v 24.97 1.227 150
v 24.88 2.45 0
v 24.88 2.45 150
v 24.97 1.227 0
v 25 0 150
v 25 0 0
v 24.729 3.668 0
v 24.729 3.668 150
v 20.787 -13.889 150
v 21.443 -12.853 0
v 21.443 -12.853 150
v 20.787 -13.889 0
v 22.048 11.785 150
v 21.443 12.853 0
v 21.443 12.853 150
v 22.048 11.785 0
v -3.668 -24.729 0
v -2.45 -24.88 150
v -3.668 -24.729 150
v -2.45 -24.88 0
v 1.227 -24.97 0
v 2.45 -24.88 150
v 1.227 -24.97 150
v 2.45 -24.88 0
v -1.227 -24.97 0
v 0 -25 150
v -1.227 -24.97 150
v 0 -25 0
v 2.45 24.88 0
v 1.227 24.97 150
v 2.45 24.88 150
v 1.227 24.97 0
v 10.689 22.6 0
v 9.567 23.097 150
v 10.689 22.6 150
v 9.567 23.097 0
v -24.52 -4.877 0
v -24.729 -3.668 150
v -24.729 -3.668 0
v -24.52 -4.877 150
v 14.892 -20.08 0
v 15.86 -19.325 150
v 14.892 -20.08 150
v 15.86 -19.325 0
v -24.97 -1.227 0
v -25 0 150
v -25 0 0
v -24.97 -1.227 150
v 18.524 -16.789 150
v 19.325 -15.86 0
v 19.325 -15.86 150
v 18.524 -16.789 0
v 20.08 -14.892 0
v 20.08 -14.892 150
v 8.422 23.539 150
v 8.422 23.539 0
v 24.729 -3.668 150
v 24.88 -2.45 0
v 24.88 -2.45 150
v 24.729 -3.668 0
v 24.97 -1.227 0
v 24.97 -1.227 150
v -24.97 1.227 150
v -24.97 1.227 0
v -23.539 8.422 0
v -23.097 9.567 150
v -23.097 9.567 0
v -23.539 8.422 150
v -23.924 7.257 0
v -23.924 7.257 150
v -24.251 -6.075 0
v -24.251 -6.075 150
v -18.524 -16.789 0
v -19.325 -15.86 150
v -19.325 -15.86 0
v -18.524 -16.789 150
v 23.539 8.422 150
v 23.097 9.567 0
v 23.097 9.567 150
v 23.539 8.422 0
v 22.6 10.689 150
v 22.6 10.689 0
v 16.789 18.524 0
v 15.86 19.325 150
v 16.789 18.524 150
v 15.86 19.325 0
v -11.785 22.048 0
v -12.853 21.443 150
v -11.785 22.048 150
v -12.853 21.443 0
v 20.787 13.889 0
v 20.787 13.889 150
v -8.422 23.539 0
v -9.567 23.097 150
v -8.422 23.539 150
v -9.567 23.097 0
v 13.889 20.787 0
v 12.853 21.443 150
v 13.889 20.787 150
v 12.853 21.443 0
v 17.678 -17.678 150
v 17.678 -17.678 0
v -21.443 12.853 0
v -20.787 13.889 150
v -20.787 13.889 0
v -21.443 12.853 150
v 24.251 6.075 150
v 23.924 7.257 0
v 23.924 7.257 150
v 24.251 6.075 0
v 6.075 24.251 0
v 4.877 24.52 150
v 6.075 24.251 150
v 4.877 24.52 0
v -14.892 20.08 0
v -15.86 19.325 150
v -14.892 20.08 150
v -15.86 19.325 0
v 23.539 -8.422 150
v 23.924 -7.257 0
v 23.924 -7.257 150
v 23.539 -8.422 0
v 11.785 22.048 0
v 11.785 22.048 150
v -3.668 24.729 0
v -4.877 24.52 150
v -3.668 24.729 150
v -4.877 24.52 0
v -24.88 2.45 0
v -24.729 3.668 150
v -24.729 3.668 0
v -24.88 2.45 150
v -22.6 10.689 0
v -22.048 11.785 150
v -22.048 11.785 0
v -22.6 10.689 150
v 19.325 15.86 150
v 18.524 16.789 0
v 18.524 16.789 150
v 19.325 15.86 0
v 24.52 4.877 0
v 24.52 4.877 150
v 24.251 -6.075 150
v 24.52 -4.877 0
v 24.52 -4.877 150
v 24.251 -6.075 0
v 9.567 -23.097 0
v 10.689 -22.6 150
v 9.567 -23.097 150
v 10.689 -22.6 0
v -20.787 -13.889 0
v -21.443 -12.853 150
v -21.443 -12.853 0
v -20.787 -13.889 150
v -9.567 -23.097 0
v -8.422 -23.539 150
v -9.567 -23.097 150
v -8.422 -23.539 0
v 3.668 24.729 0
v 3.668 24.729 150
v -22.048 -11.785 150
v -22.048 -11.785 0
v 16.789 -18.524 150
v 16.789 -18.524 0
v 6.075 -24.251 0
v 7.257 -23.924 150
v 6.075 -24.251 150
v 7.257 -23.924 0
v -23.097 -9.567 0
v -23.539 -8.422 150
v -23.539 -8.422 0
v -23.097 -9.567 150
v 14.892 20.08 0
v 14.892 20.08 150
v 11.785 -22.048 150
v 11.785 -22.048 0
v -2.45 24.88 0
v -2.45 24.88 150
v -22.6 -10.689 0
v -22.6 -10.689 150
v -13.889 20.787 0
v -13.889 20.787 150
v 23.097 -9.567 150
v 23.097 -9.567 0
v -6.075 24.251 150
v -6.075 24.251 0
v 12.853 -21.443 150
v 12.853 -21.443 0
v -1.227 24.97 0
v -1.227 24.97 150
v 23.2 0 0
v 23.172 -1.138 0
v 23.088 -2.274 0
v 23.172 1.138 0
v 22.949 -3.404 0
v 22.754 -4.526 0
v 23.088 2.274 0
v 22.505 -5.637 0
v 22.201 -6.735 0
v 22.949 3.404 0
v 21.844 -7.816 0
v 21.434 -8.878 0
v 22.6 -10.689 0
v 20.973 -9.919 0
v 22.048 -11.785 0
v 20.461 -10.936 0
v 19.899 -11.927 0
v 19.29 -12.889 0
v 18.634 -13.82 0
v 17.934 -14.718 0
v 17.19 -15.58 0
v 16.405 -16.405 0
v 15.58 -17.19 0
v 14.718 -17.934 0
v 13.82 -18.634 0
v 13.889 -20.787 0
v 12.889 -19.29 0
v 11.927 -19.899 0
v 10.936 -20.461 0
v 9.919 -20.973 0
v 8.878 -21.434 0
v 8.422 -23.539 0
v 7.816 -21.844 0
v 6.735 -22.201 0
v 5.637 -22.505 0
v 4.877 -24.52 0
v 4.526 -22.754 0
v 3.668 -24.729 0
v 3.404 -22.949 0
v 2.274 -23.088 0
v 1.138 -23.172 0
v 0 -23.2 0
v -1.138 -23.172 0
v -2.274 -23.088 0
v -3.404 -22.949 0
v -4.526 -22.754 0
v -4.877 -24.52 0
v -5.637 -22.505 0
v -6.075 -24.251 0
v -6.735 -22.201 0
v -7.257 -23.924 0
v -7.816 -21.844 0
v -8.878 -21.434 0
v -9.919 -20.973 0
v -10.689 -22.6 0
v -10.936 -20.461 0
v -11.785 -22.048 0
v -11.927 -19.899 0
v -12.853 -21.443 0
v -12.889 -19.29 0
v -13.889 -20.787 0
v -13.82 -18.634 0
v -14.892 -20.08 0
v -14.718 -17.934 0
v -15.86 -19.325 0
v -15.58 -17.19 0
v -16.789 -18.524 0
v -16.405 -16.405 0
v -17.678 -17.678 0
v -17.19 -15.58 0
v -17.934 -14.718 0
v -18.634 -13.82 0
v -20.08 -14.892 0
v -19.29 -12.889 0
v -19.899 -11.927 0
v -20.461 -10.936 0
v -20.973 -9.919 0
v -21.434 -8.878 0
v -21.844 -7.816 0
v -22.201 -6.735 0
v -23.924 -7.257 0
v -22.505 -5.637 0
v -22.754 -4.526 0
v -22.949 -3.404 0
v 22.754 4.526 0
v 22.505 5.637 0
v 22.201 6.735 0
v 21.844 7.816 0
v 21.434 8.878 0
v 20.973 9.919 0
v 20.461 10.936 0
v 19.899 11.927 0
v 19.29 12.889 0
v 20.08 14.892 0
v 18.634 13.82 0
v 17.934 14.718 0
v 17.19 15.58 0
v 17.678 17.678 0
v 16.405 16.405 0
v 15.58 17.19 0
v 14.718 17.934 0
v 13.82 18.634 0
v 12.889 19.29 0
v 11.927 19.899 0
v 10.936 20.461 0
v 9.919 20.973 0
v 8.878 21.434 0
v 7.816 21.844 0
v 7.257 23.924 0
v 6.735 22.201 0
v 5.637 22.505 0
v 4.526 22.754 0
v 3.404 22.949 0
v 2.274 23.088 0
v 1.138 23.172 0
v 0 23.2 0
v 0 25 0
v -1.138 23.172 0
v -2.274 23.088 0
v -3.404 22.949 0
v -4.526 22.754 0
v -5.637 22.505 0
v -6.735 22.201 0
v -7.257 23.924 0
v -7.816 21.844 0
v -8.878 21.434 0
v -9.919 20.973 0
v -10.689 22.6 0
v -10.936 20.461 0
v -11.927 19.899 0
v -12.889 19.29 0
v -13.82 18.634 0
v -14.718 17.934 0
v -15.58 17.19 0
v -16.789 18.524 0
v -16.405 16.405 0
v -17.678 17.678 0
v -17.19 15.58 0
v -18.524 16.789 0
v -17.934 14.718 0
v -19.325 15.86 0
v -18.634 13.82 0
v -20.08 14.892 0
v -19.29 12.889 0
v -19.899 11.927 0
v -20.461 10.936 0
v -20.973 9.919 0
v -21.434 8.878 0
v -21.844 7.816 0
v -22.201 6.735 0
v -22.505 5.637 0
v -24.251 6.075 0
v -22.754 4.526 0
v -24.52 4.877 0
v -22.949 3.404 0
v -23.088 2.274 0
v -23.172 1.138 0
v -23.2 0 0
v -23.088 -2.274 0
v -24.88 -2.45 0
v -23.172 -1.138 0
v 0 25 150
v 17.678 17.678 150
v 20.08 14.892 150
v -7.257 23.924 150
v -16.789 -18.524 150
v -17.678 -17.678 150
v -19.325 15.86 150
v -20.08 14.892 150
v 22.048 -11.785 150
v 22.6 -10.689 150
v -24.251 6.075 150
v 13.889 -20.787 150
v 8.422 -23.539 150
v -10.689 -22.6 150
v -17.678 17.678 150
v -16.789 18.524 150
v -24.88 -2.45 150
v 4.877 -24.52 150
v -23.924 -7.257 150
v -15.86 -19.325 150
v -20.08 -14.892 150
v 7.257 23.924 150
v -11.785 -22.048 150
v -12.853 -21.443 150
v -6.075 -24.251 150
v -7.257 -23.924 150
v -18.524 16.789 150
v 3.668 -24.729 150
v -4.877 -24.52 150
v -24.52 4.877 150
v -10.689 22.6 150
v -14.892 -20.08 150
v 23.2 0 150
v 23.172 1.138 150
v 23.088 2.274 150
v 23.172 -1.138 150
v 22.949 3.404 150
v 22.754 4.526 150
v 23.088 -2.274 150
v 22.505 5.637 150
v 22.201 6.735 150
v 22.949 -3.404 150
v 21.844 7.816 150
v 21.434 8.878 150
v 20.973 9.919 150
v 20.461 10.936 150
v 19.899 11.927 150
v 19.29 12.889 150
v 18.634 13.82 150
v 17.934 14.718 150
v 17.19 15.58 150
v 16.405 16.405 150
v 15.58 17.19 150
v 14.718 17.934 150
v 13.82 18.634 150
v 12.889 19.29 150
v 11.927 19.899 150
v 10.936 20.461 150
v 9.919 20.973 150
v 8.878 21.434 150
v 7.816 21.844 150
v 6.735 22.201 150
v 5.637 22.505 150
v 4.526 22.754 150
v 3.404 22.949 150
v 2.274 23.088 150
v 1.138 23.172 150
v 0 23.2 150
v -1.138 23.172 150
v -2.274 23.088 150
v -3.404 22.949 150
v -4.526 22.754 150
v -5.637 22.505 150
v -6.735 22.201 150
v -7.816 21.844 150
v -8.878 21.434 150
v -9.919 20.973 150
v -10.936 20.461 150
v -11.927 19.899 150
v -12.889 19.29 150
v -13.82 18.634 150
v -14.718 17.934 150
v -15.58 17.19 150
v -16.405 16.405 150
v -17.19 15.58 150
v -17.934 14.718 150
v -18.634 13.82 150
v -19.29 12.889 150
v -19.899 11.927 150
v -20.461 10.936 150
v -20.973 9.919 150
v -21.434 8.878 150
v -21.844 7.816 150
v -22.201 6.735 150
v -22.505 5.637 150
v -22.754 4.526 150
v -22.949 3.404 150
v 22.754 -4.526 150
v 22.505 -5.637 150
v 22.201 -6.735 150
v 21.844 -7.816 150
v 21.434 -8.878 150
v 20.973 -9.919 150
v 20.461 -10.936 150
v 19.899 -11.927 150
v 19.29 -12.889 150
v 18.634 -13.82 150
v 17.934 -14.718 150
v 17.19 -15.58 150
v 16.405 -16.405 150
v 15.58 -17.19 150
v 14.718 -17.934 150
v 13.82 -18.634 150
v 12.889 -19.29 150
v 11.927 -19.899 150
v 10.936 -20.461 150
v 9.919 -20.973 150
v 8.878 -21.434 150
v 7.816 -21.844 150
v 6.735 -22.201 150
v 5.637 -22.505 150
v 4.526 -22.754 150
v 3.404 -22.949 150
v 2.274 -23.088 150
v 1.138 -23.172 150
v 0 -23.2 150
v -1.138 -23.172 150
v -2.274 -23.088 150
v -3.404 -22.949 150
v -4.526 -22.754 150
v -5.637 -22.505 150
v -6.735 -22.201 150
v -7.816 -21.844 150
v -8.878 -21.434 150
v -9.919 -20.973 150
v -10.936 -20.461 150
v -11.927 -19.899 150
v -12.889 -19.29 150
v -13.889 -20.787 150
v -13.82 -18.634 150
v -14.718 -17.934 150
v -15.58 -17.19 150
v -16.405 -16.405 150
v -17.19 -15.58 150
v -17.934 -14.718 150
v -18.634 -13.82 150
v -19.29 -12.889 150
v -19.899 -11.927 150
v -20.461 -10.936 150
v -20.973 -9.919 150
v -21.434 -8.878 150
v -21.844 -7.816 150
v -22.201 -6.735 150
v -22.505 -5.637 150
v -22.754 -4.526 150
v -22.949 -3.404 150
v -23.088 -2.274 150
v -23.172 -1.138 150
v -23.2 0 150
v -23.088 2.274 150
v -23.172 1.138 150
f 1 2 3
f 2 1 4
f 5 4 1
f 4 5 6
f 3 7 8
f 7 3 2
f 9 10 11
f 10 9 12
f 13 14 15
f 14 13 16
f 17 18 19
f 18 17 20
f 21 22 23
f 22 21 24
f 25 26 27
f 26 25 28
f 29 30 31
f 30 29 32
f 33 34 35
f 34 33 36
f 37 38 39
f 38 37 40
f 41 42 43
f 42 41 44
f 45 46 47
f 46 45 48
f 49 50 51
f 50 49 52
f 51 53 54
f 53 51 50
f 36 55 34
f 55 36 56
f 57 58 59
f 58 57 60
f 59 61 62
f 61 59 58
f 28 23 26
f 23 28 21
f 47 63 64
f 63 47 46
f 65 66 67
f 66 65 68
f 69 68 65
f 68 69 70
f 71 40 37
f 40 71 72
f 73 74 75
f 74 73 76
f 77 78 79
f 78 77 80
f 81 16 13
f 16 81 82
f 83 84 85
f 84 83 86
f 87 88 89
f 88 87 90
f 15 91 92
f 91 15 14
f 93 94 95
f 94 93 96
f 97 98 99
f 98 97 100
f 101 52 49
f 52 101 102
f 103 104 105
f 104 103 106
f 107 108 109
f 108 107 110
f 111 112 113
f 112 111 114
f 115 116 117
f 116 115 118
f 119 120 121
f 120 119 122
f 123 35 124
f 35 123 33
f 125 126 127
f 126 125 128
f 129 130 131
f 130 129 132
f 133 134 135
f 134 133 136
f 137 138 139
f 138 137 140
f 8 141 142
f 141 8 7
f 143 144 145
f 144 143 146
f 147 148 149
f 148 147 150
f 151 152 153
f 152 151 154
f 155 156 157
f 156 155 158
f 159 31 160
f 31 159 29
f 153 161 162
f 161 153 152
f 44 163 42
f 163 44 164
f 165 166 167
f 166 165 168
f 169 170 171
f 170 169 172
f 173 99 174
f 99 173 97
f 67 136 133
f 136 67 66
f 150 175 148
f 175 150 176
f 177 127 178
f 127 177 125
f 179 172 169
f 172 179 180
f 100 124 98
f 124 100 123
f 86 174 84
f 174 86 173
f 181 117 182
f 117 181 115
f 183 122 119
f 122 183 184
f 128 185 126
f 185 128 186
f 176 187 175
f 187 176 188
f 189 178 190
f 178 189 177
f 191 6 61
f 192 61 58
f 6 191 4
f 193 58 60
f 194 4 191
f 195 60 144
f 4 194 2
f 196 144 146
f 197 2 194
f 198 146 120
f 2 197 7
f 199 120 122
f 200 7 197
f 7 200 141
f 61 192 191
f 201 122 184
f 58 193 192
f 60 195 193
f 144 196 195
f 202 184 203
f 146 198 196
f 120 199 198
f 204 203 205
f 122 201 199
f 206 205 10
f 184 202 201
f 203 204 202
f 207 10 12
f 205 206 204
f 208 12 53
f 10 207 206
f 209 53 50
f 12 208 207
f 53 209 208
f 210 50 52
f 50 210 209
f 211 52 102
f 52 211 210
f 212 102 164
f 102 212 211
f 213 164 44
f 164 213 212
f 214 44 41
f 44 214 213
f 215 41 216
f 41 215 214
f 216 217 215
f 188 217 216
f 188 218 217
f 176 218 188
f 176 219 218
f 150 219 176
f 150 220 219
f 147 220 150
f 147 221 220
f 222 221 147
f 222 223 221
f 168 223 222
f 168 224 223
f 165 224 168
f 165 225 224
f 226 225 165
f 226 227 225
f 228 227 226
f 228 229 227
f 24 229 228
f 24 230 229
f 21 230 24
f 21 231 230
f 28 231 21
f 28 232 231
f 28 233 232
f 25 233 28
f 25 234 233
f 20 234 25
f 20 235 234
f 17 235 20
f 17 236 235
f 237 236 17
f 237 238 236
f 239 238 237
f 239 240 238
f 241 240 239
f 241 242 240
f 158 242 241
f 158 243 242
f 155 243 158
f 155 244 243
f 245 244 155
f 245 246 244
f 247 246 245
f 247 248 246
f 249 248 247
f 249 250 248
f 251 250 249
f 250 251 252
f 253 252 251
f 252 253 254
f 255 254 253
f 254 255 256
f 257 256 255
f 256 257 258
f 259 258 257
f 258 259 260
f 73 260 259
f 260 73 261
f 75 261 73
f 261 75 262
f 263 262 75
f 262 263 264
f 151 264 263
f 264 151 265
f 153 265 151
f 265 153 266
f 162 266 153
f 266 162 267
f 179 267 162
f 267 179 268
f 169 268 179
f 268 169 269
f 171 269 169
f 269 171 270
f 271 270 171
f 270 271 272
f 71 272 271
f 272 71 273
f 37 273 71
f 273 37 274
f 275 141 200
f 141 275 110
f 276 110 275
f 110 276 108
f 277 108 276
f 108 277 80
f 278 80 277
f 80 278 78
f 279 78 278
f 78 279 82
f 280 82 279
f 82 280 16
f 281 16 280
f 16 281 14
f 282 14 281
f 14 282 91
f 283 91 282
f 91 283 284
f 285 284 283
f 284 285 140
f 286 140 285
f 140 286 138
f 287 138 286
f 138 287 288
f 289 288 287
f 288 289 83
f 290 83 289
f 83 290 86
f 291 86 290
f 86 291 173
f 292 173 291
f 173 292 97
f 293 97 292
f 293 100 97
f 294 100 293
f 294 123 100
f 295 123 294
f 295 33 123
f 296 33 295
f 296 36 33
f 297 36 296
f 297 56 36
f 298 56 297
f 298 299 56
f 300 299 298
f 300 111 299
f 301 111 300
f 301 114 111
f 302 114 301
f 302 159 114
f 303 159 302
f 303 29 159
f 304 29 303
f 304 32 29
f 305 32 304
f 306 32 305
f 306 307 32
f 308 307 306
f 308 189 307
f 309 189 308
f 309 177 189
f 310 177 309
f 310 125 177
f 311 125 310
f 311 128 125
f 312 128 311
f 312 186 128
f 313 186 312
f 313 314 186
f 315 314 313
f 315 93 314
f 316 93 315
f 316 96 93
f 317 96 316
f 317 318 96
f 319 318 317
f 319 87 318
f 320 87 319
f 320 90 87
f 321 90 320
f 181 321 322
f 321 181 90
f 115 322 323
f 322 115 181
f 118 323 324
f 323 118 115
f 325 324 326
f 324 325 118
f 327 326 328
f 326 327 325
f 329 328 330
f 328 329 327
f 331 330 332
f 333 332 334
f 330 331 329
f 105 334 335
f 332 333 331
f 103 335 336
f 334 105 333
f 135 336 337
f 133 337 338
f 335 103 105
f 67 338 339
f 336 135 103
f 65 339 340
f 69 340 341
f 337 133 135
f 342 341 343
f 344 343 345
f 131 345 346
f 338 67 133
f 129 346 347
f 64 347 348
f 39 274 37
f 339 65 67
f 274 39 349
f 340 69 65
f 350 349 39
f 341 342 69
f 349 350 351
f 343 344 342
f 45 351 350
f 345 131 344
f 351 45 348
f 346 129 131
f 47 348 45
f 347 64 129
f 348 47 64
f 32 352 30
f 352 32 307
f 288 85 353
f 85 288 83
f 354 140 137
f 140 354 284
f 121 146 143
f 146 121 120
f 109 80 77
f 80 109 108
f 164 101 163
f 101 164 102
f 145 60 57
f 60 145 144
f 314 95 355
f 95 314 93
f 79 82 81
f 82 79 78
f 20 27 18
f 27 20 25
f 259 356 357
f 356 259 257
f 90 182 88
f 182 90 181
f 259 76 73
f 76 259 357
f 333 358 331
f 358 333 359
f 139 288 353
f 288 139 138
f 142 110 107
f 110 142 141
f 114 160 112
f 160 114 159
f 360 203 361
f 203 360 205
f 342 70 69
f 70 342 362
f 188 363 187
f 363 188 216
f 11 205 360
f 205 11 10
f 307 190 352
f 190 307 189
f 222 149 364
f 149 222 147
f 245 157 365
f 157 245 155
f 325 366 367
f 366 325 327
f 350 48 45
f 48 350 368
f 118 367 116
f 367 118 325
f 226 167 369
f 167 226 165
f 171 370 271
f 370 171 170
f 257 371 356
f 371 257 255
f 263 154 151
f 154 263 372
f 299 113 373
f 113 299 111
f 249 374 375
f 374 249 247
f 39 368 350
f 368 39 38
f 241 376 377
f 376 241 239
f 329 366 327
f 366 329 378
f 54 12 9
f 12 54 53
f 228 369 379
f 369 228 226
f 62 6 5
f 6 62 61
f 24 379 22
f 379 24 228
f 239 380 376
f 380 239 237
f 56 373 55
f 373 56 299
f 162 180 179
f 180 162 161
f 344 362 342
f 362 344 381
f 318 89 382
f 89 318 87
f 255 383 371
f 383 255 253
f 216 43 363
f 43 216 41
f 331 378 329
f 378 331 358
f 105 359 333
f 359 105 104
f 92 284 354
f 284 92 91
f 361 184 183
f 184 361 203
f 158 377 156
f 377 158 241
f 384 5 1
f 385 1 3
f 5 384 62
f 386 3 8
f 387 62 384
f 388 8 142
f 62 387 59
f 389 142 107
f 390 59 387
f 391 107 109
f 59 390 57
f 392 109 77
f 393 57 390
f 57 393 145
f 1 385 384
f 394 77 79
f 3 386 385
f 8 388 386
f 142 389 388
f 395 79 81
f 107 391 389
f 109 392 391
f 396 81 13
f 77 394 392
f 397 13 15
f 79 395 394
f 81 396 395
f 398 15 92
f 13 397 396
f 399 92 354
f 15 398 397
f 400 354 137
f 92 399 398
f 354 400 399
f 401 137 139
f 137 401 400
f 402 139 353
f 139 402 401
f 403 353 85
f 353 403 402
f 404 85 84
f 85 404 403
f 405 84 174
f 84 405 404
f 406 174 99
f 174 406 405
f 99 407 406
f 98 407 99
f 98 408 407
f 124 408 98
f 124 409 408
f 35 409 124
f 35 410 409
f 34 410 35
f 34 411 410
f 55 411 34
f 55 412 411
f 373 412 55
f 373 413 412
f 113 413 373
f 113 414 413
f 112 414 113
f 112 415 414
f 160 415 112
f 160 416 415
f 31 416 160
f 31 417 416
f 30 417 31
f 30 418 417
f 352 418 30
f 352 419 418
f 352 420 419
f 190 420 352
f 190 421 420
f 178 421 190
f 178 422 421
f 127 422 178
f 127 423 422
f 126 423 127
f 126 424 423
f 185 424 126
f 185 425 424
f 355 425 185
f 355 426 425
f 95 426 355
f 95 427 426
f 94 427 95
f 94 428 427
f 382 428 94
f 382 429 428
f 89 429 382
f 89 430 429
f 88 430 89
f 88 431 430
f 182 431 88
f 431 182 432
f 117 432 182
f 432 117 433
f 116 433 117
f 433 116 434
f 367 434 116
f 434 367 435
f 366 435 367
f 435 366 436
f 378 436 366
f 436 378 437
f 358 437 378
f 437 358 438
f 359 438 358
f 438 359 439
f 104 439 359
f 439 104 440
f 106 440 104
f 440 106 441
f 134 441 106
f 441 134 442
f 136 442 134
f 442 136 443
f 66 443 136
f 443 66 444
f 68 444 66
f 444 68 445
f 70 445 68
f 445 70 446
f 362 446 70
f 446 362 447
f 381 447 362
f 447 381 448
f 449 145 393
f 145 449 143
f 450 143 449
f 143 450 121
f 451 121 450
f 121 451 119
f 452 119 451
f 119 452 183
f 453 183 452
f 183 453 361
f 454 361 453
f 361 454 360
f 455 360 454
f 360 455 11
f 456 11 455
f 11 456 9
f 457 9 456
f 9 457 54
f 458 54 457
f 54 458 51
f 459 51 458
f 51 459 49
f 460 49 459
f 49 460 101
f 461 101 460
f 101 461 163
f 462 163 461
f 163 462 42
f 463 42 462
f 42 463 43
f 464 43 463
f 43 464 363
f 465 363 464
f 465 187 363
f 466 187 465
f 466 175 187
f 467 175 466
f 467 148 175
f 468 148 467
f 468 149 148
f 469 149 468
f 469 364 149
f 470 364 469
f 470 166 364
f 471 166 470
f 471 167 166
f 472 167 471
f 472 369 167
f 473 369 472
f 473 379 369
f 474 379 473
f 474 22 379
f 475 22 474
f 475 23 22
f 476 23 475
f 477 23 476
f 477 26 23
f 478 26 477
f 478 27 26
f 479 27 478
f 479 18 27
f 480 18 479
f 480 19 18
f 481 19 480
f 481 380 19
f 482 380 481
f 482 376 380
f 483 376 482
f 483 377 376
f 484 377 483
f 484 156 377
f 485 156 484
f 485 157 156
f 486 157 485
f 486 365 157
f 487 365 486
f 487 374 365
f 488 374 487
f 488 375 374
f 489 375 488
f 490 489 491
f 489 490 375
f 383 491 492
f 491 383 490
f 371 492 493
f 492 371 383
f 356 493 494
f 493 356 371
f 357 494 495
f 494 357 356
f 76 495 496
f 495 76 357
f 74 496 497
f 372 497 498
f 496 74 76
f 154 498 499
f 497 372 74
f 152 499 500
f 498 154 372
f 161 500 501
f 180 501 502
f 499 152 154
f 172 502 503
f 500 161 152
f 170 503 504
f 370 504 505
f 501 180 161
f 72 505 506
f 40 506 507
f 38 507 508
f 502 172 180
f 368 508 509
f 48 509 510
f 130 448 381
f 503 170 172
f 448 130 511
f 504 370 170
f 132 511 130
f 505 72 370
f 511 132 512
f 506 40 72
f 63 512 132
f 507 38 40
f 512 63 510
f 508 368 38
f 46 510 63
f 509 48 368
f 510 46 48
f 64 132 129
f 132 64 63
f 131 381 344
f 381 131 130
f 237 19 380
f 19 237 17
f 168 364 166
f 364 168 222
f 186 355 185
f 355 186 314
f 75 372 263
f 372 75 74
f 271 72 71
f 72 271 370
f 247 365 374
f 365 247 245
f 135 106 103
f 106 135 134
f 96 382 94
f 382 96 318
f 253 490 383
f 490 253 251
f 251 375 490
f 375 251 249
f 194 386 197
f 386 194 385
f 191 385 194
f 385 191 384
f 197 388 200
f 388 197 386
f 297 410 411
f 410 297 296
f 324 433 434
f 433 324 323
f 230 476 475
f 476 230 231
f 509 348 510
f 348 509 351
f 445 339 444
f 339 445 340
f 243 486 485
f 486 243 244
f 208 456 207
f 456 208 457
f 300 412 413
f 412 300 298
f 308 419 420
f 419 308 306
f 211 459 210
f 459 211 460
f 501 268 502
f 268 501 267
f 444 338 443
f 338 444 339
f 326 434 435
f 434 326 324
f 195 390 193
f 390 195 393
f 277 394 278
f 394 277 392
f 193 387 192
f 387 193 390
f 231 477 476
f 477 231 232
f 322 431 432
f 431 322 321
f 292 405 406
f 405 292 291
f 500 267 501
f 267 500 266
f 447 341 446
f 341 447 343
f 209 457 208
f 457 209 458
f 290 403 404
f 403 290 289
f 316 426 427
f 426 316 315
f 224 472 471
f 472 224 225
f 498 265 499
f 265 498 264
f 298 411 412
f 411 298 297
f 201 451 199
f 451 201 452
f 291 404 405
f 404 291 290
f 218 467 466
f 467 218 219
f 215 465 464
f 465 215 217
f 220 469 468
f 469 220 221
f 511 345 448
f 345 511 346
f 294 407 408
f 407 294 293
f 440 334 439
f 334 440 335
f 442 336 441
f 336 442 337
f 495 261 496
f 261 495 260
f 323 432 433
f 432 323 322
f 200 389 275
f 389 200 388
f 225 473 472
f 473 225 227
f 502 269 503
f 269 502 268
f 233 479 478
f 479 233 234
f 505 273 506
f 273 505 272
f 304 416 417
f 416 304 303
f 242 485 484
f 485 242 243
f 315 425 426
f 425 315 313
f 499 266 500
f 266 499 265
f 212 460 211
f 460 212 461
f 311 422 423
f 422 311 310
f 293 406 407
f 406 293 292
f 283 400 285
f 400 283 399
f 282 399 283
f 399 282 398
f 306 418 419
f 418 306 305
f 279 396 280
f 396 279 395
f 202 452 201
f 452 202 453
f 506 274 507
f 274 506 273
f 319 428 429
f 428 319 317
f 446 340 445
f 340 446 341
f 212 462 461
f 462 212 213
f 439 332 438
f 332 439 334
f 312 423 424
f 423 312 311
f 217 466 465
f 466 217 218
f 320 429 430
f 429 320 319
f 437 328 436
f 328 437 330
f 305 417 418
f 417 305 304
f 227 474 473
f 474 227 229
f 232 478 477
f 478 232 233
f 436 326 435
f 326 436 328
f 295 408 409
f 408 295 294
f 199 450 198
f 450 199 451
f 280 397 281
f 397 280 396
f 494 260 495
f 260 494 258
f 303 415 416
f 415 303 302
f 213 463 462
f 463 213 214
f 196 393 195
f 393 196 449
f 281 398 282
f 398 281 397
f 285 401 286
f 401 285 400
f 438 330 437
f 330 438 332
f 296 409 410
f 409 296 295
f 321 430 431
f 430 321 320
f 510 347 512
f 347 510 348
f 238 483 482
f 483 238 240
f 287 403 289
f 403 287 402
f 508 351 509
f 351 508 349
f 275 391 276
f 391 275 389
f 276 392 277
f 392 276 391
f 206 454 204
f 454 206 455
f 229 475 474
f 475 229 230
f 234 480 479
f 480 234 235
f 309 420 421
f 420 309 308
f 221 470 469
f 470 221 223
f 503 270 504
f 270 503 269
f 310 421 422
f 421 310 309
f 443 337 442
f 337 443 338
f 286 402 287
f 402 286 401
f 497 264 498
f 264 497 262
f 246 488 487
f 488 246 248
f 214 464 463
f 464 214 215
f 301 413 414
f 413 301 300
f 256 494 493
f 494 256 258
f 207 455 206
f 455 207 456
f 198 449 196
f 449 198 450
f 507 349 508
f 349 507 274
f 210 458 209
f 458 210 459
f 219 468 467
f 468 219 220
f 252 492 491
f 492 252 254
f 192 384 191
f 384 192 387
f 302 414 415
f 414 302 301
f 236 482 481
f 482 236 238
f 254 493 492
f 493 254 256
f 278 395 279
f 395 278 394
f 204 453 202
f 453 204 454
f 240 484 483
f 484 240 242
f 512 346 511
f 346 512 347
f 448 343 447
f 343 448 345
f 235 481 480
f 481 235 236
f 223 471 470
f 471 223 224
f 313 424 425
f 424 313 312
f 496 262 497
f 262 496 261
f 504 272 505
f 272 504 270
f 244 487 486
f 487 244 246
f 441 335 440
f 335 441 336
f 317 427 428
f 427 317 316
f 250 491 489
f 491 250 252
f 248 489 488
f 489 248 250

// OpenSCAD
$fn=128;

// HT pipe parameters (approx. for HT 50)
pipe_length = 150;          // mm
outer_diameter = 50;        // mm (nominal)
wall_thickness = 1.8;       // mm (typical for HT)
inner_diameter = outer_diameter - 2*wall_thickness;

module ht_pipe(od, id, L){
    difference(){
        cylinder(h=L, d=od);
        translate([0,0,-0.1]) cylinder(h=L+0.2, d=id);
    }
}

ht_pipe(outer_diameter, inner_diameter, pipe_length);
